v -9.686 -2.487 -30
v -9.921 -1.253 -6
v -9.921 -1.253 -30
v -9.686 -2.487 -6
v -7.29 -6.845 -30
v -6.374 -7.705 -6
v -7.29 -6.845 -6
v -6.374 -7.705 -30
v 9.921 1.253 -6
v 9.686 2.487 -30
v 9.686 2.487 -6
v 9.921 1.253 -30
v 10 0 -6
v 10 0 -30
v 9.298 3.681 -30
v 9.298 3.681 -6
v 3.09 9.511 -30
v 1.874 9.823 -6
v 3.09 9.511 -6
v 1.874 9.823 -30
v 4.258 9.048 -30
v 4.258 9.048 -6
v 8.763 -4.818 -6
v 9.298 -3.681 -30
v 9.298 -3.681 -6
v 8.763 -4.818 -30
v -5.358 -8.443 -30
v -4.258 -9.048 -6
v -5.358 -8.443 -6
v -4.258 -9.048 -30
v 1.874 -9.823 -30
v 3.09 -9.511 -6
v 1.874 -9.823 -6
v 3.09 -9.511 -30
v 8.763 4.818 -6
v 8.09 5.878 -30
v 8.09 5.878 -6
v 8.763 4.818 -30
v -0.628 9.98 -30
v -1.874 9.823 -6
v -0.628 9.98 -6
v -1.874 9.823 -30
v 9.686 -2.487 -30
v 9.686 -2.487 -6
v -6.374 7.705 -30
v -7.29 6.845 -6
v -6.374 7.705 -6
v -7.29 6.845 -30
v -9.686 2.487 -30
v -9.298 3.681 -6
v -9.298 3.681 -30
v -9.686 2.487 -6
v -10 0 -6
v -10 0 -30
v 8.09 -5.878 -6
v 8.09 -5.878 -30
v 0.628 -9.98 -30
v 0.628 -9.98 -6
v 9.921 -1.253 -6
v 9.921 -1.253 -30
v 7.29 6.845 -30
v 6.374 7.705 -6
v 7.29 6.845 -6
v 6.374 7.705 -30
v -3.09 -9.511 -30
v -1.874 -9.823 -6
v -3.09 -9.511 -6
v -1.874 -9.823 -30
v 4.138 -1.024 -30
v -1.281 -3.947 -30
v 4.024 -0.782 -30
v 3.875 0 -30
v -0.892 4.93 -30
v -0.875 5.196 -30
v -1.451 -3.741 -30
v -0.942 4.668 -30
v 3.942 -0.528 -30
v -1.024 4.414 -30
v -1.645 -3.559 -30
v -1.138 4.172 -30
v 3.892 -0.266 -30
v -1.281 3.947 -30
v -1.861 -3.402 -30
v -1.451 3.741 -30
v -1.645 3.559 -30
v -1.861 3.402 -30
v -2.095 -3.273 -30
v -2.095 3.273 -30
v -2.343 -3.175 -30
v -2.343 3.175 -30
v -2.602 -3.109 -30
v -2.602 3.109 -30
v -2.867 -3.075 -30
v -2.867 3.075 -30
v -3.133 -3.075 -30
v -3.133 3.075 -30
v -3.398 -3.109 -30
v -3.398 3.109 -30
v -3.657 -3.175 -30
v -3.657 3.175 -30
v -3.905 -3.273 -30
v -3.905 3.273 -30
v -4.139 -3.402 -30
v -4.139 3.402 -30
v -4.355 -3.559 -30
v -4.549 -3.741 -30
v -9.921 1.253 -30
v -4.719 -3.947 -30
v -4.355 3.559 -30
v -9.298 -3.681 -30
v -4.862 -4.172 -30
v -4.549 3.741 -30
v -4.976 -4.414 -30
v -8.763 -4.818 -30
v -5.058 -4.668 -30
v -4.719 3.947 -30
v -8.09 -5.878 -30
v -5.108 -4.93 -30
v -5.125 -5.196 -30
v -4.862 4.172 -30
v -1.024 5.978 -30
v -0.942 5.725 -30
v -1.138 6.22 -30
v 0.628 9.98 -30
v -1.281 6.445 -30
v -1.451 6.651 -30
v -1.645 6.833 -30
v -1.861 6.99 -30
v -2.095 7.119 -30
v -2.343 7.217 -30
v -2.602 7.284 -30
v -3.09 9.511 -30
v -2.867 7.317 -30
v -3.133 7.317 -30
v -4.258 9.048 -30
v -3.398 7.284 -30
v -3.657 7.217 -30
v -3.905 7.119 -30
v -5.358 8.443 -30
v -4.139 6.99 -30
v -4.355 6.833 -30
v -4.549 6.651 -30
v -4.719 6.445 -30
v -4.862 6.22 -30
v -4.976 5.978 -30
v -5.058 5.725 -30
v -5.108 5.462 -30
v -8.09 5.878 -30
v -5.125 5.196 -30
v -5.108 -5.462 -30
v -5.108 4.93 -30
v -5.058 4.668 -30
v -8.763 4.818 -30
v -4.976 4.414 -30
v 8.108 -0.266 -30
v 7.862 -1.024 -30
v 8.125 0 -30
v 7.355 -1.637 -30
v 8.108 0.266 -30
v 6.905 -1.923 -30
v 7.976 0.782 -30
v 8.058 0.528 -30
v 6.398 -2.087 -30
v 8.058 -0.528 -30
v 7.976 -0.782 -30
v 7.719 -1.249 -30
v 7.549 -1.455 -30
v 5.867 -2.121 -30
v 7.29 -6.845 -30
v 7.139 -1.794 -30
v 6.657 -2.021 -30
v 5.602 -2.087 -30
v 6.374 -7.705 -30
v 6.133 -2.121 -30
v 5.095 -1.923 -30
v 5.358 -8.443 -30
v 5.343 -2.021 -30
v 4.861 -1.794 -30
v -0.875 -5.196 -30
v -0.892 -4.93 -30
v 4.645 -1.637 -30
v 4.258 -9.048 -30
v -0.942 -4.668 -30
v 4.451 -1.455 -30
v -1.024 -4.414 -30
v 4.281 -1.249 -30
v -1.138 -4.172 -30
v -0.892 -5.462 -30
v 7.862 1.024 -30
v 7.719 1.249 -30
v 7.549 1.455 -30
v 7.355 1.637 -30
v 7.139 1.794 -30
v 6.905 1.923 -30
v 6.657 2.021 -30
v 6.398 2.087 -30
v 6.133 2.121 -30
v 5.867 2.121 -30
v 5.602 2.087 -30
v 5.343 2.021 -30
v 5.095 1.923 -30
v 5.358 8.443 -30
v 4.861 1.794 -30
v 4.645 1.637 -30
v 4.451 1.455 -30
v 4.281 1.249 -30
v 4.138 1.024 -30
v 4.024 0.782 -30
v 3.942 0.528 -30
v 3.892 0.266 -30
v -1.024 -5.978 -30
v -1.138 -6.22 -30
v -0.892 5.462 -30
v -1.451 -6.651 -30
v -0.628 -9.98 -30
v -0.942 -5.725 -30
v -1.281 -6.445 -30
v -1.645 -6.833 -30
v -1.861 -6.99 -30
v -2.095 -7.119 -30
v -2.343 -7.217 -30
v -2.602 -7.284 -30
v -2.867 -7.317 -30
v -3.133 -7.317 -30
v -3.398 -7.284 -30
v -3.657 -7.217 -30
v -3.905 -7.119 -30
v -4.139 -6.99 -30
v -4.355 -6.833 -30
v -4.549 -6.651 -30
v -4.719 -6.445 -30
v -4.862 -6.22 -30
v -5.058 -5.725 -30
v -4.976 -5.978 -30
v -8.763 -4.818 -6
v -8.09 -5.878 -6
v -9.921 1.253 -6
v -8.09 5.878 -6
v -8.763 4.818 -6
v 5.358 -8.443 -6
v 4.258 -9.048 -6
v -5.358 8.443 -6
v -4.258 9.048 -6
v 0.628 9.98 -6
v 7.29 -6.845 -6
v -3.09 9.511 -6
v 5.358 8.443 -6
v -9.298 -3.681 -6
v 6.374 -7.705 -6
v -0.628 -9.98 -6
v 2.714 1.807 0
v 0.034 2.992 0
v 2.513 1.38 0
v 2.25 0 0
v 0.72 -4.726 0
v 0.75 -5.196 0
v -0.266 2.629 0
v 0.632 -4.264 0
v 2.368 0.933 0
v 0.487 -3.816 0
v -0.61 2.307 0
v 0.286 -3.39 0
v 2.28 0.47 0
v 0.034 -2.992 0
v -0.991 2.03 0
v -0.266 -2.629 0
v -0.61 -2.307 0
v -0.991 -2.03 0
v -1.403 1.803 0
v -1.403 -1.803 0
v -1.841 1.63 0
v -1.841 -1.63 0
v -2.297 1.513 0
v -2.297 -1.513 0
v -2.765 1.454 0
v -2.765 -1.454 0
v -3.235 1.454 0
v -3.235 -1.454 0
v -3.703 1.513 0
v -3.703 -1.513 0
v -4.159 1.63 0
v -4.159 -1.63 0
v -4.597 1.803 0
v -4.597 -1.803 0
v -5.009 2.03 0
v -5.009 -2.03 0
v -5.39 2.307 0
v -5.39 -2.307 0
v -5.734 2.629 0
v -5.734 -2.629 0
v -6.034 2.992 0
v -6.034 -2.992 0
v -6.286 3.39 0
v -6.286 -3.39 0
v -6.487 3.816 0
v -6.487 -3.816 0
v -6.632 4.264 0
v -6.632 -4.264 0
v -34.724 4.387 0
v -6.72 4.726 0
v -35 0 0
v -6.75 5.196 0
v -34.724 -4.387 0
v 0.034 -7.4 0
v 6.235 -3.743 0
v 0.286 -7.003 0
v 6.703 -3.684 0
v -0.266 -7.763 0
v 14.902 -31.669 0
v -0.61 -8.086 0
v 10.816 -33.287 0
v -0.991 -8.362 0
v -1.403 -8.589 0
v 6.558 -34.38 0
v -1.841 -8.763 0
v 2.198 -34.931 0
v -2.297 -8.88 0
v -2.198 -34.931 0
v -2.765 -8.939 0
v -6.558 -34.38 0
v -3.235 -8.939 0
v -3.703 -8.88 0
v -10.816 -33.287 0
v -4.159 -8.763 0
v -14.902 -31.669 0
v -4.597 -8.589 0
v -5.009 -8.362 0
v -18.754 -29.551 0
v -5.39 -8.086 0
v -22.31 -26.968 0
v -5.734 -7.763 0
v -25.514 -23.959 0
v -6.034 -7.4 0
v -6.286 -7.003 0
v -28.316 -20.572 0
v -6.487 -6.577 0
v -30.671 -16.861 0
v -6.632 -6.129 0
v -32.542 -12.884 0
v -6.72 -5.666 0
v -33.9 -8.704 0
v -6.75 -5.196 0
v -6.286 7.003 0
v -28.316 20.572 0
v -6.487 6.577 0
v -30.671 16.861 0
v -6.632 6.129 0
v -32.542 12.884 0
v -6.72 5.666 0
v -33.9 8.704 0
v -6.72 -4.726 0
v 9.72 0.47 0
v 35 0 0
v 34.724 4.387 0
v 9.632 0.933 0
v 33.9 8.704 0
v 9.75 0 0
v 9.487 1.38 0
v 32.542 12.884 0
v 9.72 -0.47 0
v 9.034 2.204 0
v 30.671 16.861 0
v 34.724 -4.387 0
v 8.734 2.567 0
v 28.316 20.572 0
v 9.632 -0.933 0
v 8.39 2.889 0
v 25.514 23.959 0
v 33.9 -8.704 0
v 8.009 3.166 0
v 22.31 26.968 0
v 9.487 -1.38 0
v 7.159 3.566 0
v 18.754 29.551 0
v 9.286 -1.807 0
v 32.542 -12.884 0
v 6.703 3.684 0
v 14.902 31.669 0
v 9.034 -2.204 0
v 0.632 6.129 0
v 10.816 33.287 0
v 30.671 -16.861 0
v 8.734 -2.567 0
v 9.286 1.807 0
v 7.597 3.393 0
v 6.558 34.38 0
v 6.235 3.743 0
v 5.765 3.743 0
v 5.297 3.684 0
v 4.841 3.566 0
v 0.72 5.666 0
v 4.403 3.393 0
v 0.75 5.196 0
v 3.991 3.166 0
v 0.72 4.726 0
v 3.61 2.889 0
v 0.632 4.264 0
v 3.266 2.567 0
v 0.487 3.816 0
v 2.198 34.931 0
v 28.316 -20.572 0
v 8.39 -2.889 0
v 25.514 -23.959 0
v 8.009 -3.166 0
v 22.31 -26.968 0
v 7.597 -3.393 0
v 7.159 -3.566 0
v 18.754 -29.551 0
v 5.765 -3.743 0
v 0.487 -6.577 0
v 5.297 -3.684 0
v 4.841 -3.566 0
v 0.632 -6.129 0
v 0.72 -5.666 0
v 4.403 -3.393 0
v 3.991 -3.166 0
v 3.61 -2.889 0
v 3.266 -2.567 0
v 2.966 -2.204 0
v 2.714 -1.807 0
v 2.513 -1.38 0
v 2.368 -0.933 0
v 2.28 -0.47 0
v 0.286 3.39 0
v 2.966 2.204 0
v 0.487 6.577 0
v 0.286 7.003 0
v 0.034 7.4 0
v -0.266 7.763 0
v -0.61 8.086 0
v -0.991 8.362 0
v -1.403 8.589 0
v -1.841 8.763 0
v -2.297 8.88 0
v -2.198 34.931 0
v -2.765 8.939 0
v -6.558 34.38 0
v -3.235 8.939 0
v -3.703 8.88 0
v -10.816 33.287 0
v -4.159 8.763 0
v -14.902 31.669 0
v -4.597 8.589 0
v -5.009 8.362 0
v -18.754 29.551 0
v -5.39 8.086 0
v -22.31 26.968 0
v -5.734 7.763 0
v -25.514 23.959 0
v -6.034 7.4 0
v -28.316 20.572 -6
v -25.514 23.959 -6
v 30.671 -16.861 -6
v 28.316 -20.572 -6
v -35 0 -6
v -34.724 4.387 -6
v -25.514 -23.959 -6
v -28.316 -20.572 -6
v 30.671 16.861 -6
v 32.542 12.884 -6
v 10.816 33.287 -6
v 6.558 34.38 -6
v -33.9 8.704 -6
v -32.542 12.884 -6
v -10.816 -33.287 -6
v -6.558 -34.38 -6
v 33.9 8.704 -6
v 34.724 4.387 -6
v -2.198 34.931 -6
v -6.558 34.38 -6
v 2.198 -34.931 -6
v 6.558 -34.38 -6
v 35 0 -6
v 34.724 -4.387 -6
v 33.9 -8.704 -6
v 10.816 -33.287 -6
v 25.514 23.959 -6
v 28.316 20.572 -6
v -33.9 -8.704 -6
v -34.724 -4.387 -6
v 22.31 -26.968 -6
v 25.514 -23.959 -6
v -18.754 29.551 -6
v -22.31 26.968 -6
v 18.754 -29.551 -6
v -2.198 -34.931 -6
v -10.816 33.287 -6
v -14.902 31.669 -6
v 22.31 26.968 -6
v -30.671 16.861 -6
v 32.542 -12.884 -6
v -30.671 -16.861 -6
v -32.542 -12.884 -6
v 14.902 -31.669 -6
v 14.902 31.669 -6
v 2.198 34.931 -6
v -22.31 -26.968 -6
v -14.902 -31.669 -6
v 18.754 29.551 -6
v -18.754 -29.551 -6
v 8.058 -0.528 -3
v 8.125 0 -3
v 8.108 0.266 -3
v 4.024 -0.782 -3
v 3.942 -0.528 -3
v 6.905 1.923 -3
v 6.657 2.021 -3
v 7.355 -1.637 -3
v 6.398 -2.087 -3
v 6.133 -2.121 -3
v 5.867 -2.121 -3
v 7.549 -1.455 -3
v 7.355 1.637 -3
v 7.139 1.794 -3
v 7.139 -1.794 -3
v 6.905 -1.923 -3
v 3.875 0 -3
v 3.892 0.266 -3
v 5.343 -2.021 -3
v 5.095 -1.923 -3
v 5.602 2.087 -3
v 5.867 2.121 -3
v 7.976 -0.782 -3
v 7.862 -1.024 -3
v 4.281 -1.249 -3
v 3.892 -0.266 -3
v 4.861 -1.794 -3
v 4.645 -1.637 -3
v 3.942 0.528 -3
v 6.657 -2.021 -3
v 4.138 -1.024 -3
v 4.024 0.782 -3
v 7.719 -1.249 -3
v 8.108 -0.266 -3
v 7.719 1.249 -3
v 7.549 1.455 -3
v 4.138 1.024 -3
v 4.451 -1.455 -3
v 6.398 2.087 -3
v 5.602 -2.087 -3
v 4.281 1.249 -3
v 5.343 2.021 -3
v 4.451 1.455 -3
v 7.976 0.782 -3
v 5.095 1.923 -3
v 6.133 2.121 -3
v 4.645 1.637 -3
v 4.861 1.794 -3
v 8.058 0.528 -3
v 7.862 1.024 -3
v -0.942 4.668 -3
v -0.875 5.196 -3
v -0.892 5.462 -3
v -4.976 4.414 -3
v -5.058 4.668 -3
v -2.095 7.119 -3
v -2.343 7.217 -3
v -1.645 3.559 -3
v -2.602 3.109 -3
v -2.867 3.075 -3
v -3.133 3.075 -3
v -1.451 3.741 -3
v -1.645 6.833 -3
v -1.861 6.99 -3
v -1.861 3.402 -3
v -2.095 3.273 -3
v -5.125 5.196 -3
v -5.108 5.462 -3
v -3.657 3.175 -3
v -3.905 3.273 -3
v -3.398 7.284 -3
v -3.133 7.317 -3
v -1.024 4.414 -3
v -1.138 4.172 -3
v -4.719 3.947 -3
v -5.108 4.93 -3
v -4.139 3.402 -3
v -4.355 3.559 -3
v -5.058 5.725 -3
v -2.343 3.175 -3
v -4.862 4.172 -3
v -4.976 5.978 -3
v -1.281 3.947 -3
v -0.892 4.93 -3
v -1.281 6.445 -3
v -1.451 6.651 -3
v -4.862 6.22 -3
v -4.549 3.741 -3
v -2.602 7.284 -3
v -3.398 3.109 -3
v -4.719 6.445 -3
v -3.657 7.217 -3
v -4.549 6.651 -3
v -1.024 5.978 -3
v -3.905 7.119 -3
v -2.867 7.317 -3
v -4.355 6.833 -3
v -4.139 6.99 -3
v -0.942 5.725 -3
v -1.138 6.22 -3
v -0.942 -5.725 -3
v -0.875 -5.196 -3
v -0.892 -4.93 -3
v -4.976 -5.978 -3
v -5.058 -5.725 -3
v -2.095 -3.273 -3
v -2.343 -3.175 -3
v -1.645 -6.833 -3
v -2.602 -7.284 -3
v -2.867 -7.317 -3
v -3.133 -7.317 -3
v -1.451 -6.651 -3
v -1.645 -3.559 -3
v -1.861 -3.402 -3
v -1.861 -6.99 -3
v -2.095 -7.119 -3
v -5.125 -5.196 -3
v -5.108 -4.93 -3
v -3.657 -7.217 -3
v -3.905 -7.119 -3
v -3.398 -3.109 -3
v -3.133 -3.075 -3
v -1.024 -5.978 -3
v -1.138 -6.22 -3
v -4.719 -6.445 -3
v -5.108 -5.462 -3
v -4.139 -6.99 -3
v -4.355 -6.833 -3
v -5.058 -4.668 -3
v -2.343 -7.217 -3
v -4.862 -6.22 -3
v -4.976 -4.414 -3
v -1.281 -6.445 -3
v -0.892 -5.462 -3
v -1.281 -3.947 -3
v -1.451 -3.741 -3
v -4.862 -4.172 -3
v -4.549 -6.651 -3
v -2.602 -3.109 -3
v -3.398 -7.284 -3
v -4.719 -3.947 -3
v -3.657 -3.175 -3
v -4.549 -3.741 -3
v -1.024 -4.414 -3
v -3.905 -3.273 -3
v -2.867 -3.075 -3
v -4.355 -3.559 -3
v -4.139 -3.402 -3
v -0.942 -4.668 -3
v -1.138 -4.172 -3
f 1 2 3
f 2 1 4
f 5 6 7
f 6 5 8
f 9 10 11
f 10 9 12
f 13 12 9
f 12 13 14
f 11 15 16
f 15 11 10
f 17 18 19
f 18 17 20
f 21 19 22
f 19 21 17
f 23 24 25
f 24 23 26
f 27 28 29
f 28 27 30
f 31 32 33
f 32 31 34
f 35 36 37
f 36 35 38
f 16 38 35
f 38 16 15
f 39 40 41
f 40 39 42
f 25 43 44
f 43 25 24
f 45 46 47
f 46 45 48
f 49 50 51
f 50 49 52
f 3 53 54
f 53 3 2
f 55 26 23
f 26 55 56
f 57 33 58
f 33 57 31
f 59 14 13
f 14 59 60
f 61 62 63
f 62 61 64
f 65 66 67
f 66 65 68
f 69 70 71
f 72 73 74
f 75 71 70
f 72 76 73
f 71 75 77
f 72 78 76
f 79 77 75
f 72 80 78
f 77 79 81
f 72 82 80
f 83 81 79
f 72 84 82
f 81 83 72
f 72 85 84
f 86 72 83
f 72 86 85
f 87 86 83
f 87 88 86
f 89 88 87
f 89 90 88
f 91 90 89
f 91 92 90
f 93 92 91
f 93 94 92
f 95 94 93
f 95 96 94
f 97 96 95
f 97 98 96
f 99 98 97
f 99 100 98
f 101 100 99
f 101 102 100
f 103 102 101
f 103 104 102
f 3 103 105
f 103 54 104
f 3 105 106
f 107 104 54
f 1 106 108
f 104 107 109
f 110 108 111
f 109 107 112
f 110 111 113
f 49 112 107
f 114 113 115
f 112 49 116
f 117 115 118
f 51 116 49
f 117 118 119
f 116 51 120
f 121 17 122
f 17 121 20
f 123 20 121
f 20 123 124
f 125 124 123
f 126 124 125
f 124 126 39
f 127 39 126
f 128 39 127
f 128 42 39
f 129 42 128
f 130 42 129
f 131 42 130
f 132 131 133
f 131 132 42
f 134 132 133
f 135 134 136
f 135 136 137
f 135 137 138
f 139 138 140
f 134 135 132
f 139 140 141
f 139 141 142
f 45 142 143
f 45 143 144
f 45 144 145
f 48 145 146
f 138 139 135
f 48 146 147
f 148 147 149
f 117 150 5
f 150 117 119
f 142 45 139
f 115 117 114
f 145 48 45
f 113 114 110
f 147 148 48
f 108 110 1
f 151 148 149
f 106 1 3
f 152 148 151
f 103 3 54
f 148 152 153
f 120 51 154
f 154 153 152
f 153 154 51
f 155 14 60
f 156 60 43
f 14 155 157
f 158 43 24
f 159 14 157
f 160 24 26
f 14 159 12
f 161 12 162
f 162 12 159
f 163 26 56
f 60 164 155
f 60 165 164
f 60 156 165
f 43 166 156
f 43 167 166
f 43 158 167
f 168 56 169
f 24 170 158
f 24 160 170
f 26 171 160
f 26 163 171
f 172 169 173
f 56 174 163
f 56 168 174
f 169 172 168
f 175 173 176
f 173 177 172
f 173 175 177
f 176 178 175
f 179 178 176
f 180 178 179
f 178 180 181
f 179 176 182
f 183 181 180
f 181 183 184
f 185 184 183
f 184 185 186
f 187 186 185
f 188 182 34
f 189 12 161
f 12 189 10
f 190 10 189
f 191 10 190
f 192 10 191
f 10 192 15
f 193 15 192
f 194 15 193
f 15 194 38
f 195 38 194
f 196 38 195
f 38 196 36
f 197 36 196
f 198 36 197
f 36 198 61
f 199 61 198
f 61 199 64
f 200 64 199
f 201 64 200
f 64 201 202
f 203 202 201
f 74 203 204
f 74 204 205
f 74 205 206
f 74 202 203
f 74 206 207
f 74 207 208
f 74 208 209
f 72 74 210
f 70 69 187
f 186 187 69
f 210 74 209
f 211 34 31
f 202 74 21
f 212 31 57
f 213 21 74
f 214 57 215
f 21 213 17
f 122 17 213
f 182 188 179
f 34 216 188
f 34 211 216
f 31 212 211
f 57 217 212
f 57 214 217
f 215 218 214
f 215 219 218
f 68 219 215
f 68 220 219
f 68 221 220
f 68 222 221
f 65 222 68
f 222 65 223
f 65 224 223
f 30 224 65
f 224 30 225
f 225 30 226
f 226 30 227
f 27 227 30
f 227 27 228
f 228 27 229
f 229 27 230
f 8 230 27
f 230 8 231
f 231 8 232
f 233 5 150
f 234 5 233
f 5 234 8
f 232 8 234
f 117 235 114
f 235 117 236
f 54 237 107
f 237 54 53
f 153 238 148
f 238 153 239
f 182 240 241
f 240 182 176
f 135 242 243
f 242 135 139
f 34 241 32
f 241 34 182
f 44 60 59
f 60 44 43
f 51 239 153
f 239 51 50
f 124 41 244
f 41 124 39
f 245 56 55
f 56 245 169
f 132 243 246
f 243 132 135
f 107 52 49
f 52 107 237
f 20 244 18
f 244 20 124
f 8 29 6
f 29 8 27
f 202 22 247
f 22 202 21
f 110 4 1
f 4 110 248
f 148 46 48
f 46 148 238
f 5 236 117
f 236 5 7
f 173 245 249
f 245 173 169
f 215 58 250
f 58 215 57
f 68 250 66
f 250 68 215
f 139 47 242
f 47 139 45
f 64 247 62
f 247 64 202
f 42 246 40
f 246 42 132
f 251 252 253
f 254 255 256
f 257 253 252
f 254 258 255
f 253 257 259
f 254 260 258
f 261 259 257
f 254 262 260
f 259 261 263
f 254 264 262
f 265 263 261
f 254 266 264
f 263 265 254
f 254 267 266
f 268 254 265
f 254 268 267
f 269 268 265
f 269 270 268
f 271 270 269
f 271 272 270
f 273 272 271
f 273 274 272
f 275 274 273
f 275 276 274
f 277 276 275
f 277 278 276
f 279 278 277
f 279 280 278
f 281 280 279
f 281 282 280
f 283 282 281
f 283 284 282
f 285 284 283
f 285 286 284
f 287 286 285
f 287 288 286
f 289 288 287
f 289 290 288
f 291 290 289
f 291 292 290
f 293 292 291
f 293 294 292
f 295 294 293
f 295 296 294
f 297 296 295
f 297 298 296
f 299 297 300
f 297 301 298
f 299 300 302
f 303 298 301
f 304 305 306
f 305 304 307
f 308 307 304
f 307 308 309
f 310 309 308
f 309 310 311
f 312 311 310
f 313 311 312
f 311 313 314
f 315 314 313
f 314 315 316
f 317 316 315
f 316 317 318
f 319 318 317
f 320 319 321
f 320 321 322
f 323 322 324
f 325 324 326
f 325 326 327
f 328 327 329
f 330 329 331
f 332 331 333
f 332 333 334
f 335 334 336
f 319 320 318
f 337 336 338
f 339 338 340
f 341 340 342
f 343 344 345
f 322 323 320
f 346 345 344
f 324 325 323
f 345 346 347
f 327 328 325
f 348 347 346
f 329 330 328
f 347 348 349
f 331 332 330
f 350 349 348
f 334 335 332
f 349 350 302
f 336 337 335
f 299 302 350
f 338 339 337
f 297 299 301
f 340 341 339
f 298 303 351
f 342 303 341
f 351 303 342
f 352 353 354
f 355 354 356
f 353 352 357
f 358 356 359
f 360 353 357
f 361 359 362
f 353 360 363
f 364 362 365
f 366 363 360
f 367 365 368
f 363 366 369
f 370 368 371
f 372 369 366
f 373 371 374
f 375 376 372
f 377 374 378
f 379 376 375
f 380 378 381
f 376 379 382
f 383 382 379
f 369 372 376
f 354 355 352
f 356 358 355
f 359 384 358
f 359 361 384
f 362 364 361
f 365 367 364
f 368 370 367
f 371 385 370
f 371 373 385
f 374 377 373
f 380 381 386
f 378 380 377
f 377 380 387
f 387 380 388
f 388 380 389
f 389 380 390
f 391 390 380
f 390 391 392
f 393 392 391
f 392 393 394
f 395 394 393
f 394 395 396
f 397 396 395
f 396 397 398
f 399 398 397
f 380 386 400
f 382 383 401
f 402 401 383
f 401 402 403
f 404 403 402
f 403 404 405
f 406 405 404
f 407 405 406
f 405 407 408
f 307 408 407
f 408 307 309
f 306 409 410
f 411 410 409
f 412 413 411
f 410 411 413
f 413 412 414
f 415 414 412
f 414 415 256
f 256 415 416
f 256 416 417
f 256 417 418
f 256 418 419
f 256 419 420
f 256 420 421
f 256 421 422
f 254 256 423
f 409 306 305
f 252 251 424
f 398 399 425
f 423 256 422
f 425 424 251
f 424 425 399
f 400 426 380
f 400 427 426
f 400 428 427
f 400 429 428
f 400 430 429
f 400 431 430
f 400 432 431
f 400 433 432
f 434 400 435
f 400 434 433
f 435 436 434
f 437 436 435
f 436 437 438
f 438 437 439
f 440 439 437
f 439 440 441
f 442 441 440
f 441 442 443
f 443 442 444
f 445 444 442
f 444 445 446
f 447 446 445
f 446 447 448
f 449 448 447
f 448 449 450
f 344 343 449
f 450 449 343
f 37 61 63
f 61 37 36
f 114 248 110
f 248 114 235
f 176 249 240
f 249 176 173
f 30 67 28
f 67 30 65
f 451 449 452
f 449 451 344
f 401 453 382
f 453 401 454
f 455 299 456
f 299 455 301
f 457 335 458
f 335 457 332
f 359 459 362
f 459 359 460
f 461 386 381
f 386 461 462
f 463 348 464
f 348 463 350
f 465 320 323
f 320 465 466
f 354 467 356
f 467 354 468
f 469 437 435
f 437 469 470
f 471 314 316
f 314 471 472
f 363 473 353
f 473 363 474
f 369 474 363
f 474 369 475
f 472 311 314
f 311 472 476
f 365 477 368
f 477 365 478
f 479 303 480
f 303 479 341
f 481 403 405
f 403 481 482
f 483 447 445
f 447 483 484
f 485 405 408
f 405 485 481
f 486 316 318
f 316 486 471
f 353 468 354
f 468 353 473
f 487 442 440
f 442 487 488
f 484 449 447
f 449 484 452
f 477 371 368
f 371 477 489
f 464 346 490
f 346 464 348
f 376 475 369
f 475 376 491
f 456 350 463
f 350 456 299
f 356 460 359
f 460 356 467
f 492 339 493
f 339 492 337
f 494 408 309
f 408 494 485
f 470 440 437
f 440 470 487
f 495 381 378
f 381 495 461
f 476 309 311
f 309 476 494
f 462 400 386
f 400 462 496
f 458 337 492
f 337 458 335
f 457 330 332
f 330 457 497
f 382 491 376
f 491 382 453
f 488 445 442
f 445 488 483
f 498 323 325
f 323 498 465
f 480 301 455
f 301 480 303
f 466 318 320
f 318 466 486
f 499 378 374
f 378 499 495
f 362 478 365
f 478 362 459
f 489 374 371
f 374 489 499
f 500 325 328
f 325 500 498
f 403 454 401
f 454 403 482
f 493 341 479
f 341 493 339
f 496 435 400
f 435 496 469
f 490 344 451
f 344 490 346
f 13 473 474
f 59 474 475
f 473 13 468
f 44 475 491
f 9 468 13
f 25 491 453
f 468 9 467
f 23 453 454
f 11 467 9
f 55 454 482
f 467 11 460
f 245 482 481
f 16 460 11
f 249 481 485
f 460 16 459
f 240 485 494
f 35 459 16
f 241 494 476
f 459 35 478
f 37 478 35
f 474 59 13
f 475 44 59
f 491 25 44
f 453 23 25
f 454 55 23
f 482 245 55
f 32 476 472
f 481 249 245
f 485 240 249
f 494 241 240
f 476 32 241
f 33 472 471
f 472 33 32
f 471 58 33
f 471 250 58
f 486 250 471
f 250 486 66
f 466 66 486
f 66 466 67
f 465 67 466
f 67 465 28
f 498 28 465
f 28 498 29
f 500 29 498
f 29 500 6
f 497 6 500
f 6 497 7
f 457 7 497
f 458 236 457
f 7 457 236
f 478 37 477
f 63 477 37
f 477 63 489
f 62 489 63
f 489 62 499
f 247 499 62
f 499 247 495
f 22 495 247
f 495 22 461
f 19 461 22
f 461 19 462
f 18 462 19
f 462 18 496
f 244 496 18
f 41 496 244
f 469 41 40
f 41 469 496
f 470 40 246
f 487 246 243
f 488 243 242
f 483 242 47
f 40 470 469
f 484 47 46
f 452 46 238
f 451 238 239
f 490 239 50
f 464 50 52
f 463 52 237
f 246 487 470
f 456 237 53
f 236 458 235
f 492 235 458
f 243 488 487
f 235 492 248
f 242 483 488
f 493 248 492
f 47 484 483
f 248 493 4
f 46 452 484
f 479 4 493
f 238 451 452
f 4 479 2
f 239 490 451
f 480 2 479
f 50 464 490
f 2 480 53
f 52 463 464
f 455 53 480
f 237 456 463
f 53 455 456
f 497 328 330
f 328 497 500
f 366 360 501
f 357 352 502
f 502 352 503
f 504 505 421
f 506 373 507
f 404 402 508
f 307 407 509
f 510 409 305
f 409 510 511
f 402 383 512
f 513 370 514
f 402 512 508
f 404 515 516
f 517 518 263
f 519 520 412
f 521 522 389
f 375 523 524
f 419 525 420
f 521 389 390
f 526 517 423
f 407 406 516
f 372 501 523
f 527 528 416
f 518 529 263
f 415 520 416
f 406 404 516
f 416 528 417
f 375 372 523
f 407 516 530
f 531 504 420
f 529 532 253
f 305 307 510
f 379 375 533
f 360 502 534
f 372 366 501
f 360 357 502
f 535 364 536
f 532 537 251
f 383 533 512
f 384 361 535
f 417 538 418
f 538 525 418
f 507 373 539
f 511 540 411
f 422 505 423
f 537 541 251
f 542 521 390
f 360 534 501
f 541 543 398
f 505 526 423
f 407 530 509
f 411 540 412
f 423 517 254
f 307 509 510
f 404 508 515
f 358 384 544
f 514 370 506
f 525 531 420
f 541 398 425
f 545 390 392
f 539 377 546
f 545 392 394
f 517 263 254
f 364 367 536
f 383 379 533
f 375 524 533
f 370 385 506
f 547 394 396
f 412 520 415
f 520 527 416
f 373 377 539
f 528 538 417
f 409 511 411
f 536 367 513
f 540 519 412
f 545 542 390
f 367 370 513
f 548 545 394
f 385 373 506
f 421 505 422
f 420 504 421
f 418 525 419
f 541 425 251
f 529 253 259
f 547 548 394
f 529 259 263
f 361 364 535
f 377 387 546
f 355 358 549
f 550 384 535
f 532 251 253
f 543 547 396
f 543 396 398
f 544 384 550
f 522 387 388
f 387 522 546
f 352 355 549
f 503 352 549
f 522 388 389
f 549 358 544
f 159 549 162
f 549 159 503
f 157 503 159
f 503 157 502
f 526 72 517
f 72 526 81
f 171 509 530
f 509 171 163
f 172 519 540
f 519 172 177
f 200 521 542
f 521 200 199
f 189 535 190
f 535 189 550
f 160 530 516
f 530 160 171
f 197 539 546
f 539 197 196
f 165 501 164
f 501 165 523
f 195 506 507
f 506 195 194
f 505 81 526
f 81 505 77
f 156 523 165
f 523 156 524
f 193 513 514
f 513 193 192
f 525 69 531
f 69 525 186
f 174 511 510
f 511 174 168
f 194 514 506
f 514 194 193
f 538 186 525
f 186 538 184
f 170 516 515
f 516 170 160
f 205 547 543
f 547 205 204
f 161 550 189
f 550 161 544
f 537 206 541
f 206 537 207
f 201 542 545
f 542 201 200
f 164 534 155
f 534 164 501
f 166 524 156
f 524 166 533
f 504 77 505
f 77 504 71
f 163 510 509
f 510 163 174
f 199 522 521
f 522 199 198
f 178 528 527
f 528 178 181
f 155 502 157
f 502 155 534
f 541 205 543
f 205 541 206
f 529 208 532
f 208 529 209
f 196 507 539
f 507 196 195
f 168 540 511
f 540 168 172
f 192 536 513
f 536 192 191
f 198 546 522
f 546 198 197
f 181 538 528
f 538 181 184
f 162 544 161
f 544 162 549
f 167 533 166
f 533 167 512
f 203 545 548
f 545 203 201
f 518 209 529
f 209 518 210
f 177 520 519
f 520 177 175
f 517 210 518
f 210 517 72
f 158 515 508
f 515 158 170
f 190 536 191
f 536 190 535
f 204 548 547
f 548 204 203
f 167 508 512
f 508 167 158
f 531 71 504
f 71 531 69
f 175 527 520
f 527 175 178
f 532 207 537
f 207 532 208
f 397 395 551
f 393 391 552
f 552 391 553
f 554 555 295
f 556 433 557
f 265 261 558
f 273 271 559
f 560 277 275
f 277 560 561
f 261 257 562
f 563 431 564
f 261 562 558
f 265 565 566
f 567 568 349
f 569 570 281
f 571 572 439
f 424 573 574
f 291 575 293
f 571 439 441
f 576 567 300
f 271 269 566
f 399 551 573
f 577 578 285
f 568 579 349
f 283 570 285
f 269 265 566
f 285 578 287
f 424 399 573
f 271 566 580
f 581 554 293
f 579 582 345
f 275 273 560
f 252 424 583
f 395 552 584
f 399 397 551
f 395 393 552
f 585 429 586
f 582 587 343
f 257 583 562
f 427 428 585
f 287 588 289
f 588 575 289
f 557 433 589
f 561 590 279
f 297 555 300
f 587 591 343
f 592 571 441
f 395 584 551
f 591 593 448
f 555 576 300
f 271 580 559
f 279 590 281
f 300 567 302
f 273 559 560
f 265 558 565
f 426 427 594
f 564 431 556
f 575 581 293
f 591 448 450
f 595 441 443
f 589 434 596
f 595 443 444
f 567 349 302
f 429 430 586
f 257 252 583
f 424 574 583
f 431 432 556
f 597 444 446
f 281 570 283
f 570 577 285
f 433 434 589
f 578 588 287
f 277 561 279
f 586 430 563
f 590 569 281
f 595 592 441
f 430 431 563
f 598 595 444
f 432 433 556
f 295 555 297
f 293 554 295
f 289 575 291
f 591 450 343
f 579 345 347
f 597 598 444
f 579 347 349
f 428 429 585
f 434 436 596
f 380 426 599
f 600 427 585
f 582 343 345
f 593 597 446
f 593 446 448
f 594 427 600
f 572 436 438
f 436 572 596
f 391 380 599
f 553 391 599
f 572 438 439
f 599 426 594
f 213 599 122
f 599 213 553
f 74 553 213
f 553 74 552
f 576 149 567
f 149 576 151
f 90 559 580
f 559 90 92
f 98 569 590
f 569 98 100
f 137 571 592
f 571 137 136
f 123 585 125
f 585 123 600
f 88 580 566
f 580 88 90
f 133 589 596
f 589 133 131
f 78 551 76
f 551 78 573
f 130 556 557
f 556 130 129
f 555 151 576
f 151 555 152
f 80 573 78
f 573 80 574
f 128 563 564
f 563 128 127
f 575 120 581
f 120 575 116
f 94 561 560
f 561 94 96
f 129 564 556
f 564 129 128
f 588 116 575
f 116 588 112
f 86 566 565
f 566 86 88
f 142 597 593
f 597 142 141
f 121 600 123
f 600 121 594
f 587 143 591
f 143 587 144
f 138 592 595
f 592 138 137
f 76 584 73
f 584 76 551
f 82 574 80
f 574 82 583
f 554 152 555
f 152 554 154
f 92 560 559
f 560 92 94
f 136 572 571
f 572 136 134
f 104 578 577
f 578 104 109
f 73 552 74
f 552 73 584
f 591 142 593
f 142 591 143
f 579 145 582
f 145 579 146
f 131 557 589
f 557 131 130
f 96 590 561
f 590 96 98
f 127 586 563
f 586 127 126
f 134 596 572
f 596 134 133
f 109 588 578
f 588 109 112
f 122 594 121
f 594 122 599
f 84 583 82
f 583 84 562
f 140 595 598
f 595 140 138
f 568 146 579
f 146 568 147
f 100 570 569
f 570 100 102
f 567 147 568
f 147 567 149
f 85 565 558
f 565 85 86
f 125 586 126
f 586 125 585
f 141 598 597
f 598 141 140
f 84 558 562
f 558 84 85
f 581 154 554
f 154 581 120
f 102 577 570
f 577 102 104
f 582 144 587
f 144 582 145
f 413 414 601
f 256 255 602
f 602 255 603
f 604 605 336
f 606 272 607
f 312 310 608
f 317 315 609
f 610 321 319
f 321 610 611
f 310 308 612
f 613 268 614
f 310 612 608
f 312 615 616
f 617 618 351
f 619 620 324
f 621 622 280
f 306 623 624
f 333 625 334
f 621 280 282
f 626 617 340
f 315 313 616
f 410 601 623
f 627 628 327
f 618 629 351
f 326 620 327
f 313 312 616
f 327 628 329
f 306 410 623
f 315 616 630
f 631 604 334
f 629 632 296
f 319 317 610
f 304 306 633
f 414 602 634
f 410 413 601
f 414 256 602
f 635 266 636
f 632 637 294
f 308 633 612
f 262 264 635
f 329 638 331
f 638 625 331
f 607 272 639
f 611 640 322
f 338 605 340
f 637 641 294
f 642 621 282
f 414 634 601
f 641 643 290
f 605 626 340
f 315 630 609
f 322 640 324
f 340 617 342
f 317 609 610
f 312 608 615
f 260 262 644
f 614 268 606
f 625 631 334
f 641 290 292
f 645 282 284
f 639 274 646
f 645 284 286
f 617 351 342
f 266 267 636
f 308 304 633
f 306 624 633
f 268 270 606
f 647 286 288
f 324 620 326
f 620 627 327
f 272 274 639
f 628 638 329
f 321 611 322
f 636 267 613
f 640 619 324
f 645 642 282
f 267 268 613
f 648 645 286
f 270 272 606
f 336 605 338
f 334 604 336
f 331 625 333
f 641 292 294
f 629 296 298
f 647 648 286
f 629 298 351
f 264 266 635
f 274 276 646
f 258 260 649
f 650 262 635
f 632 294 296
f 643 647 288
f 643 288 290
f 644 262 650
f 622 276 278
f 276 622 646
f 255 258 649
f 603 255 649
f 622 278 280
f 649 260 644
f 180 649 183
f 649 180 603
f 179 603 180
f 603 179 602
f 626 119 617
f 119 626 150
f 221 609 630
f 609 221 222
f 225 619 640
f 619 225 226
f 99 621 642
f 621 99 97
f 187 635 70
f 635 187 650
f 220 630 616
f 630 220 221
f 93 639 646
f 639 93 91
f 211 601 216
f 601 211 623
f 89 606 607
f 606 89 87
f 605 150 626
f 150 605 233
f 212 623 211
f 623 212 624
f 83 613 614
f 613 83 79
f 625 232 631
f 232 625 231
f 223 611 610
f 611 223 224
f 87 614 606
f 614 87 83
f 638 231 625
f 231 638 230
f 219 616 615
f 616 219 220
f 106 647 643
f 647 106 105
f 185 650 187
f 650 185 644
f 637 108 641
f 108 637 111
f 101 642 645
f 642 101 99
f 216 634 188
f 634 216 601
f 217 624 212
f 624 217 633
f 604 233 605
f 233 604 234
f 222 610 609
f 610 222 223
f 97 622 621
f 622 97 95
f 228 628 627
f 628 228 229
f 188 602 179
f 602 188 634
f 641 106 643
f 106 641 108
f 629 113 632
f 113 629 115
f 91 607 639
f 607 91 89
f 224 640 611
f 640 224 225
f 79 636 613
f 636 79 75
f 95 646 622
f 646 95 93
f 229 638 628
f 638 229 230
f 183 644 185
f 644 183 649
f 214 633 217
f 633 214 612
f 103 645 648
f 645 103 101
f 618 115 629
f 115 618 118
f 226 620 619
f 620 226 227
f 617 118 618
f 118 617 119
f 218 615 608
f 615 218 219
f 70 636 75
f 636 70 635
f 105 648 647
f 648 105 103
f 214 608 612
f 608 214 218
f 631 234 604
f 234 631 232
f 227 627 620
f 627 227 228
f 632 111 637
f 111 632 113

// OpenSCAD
$fn = 50;


difference() {
	union() {
		translate(v = [0, 0, -30.0000000000]) {
			cylinder(h = 30, r = 10.0000000000);
		}
		translate(v = [0, 0, -6.0000000000]) {
			cylinder(h = 6, r = 35.0000000000);
		}
	}
	union() {
		translate(v = [6.0000000000, 0.0000000000, 0]) {
			rotate(a = [0, 0, 0]) {
				difference() {
					union() {
						#translate(v = [0, 0, -30.0000000000]) {
							cylinder(h = 30, r = 2.0000000000);
						}
						#translate(v = [0, 0, -3]) {
							cylinder(h = 3, r = 10.0000000000, r1 = 2.1250000000, r2 = 3.7500000000);
						}
						#translate(v = [0, 0, -30.0000000000]) {
							cylinder(h = 30, r = 2.1250000000);
						}
						#translate(v = [0, 0, -30.0000000000]) {
							cylinder(h = 30, r = 2.0000000000);
						}
					}
					union();
				}
			}
		}
		translate(v = [-3.0000000000, 5.1961524227, 0]) {
			rotate(a = [0, 0, 0]) {
				difference() {
					union() {
						#translate(v = [0, 0, -30.0000000000]) {
							cylinder(h = 30, r = 2.0000000000);
						}
						#translate(v = [0, 0, -3]) {
							cylinder(h = 3, r = 10.0000000000, r1 = 2.1250000000, r2 = 3.7500000000);
						}
						#translate(v = [0, 0, -30.0000000000]) {
							cylinder(h = 30, r = 2.1250000000);
						}
						#translate(v = [0, 0, -30.0000000000]) {
							cylinder(h = 30, r = 2.0000000000);
						}
					}
					union();
				}
			}
		}
		translate(v = [-3.0000000000, -5.1961524227, 0]) {
			rotate(a = [0, 0, 0]) {
				difference() {
					union() {
						#translate(v = [0, 0, -30.0000000000]) {
							cylinder(h = 30, r = 2.0000000000);
						}
						#translate(v = [0, 0, -3]) {
							cylinder(h = 3, r = 10.0000000000, r1 = 2.1250000000, r2 = 3.7500000000);
						}
						#translate(v = [0, 0, -30.0000000000]) {
							cylinder(h = 30, r = 2.1250000000);
						}
						#translate(v = [0, 0, -30.0000000000]) {
							cylinder(h = 30, r = 2.0000000000);
						}
					}
					union();
				}
			}
		}
	}
}
